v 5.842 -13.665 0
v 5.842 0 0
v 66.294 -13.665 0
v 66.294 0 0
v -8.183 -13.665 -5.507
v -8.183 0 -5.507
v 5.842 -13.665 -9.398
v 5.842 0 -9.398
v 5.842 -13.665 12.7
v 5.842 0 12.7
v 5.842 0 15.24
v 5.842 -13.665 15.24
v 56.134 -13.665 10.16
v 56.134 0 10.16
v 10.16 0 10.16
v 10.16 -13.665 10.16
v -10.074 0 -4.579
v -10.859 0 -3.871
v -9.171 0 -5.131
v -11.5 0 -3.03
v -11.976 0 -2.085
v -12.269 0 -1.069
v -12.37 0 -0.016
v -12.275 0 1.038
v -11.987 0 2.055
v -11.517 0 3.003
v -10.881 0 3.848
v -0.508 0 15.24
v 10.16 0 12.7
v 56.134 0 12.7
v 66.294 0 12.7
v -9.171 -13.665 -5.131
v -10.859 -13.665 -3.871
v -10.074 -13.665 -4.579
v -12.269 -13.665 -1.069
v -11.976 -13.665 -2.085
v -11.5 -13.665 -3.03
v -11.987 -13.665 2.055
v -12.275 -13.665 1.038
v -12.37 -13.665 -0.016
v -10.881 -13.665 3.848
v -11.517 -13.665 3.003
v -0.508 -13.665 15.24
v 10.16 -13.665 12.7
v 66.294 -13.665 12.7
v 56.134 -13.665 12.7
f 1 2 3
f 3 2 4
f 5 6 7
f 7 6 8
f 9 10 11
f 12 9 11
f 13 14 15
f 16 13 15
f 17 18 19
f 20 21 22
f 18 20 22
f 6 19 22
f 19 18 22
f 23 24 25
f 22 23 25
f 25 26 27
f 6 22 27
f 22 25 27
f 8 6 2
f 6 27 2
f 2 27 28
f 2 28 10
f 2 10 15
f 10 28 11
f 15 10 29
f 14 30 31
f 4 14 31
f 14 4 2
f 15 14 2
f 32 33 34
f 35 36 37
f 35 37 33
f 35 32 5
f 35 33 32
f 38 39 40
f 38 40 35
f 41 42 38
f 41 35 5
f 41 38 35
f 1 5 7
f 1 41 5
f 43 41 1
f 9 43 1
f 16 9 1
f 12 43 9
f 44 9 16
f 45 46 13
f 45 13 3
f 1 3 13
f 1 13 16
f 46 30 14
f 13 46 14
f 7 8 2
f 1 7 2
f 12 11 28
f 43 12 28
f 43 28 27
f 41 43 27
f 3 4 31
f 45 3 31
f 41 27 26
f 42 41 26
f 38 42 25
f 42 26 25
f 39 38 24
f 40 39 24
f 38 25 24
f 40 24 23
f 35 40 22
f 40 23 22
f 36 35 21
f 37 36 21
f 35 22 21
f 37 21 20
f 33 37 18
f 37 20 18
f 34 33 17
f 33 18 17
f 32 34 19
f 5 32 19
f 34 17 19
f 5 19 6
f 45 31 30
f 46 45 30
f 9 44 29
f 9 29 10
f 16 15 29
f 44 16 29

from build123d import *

# Parameters (mm, degrees)
F0_R     = 3.175
F0_W     = 5.842
F0_H     = 12.7
F1_DEPTH = 13.6652


with BuildPart() as f1:
    # F0 (on Front) → F1 (new body)
    with BuildSketch(Plane.XZ):
        Polygon((5.842, 12.7), (5.842, 0), (66.294, 0), (66.294, 12.7), (56.134, 12.7), (56.134, 10.16), (10.16, 10.16), (10.16, 12.7), align=None)
        with BuildLine():
            ThreePointArc((-8.1826630726, -5.5069827884), (-3.1957909266, -4.5493385486), (-0.9398, 0))
            ThreePointArc((-0.9398, 0), (-4.5919612295, 5.3297205562), (-10.8806298187, 3.8475430269))
            ThreePointArc((-10.8806298187, 3.8475430269), (-12.1459778134, -1.5837270034), (-8.1826630726, -5.5069827884))
        make_face()
        with Locations((-6.6548, 0)):
            Circle(F0_R, mode=Mode.SUBTRACT)
        with BuildLine():
            Line((-0.9398, 0), (0, 0))
            Line((0, 0), (0, 12.7))
            Line((0, 12.7), (5.842, 12.7))
            Line((5.842, 12.7), (5.842, 15.24))
            Line((5.842, 15.24), (-0.508, 15.24))
            Line((-0.508, 15.24), (-10.8806298187, 3.8475430269))
            ThreePointArc((-10.8806298187, 3.8475430269), (-4.5919612295, 5.3297205562), (-0.9398, 0))
        make_face()
        with Locations((2.921, 6.35)):
            Rectangle(F0_W, F0_H)
        with BuildLine():
            Line((5.842, 0), (0, 0))
            Line((0, 0), (-0.9398, 0))
            ThreePointArc((-0.9398, 0), (-3.1957909266, -4.5493385486), (-8.1826630726, -5.5069827884))
            Line((-8.1826630726, -5.5069827884), (5.842, -9.398))
            Line((5.842, -9.398), (5.842, 0))
        make_face()
        with Locations((-6.6548, 0)):
            Circle(F0_R)
    extrude(amount=F1_DEPTH)


solid = f1.part
